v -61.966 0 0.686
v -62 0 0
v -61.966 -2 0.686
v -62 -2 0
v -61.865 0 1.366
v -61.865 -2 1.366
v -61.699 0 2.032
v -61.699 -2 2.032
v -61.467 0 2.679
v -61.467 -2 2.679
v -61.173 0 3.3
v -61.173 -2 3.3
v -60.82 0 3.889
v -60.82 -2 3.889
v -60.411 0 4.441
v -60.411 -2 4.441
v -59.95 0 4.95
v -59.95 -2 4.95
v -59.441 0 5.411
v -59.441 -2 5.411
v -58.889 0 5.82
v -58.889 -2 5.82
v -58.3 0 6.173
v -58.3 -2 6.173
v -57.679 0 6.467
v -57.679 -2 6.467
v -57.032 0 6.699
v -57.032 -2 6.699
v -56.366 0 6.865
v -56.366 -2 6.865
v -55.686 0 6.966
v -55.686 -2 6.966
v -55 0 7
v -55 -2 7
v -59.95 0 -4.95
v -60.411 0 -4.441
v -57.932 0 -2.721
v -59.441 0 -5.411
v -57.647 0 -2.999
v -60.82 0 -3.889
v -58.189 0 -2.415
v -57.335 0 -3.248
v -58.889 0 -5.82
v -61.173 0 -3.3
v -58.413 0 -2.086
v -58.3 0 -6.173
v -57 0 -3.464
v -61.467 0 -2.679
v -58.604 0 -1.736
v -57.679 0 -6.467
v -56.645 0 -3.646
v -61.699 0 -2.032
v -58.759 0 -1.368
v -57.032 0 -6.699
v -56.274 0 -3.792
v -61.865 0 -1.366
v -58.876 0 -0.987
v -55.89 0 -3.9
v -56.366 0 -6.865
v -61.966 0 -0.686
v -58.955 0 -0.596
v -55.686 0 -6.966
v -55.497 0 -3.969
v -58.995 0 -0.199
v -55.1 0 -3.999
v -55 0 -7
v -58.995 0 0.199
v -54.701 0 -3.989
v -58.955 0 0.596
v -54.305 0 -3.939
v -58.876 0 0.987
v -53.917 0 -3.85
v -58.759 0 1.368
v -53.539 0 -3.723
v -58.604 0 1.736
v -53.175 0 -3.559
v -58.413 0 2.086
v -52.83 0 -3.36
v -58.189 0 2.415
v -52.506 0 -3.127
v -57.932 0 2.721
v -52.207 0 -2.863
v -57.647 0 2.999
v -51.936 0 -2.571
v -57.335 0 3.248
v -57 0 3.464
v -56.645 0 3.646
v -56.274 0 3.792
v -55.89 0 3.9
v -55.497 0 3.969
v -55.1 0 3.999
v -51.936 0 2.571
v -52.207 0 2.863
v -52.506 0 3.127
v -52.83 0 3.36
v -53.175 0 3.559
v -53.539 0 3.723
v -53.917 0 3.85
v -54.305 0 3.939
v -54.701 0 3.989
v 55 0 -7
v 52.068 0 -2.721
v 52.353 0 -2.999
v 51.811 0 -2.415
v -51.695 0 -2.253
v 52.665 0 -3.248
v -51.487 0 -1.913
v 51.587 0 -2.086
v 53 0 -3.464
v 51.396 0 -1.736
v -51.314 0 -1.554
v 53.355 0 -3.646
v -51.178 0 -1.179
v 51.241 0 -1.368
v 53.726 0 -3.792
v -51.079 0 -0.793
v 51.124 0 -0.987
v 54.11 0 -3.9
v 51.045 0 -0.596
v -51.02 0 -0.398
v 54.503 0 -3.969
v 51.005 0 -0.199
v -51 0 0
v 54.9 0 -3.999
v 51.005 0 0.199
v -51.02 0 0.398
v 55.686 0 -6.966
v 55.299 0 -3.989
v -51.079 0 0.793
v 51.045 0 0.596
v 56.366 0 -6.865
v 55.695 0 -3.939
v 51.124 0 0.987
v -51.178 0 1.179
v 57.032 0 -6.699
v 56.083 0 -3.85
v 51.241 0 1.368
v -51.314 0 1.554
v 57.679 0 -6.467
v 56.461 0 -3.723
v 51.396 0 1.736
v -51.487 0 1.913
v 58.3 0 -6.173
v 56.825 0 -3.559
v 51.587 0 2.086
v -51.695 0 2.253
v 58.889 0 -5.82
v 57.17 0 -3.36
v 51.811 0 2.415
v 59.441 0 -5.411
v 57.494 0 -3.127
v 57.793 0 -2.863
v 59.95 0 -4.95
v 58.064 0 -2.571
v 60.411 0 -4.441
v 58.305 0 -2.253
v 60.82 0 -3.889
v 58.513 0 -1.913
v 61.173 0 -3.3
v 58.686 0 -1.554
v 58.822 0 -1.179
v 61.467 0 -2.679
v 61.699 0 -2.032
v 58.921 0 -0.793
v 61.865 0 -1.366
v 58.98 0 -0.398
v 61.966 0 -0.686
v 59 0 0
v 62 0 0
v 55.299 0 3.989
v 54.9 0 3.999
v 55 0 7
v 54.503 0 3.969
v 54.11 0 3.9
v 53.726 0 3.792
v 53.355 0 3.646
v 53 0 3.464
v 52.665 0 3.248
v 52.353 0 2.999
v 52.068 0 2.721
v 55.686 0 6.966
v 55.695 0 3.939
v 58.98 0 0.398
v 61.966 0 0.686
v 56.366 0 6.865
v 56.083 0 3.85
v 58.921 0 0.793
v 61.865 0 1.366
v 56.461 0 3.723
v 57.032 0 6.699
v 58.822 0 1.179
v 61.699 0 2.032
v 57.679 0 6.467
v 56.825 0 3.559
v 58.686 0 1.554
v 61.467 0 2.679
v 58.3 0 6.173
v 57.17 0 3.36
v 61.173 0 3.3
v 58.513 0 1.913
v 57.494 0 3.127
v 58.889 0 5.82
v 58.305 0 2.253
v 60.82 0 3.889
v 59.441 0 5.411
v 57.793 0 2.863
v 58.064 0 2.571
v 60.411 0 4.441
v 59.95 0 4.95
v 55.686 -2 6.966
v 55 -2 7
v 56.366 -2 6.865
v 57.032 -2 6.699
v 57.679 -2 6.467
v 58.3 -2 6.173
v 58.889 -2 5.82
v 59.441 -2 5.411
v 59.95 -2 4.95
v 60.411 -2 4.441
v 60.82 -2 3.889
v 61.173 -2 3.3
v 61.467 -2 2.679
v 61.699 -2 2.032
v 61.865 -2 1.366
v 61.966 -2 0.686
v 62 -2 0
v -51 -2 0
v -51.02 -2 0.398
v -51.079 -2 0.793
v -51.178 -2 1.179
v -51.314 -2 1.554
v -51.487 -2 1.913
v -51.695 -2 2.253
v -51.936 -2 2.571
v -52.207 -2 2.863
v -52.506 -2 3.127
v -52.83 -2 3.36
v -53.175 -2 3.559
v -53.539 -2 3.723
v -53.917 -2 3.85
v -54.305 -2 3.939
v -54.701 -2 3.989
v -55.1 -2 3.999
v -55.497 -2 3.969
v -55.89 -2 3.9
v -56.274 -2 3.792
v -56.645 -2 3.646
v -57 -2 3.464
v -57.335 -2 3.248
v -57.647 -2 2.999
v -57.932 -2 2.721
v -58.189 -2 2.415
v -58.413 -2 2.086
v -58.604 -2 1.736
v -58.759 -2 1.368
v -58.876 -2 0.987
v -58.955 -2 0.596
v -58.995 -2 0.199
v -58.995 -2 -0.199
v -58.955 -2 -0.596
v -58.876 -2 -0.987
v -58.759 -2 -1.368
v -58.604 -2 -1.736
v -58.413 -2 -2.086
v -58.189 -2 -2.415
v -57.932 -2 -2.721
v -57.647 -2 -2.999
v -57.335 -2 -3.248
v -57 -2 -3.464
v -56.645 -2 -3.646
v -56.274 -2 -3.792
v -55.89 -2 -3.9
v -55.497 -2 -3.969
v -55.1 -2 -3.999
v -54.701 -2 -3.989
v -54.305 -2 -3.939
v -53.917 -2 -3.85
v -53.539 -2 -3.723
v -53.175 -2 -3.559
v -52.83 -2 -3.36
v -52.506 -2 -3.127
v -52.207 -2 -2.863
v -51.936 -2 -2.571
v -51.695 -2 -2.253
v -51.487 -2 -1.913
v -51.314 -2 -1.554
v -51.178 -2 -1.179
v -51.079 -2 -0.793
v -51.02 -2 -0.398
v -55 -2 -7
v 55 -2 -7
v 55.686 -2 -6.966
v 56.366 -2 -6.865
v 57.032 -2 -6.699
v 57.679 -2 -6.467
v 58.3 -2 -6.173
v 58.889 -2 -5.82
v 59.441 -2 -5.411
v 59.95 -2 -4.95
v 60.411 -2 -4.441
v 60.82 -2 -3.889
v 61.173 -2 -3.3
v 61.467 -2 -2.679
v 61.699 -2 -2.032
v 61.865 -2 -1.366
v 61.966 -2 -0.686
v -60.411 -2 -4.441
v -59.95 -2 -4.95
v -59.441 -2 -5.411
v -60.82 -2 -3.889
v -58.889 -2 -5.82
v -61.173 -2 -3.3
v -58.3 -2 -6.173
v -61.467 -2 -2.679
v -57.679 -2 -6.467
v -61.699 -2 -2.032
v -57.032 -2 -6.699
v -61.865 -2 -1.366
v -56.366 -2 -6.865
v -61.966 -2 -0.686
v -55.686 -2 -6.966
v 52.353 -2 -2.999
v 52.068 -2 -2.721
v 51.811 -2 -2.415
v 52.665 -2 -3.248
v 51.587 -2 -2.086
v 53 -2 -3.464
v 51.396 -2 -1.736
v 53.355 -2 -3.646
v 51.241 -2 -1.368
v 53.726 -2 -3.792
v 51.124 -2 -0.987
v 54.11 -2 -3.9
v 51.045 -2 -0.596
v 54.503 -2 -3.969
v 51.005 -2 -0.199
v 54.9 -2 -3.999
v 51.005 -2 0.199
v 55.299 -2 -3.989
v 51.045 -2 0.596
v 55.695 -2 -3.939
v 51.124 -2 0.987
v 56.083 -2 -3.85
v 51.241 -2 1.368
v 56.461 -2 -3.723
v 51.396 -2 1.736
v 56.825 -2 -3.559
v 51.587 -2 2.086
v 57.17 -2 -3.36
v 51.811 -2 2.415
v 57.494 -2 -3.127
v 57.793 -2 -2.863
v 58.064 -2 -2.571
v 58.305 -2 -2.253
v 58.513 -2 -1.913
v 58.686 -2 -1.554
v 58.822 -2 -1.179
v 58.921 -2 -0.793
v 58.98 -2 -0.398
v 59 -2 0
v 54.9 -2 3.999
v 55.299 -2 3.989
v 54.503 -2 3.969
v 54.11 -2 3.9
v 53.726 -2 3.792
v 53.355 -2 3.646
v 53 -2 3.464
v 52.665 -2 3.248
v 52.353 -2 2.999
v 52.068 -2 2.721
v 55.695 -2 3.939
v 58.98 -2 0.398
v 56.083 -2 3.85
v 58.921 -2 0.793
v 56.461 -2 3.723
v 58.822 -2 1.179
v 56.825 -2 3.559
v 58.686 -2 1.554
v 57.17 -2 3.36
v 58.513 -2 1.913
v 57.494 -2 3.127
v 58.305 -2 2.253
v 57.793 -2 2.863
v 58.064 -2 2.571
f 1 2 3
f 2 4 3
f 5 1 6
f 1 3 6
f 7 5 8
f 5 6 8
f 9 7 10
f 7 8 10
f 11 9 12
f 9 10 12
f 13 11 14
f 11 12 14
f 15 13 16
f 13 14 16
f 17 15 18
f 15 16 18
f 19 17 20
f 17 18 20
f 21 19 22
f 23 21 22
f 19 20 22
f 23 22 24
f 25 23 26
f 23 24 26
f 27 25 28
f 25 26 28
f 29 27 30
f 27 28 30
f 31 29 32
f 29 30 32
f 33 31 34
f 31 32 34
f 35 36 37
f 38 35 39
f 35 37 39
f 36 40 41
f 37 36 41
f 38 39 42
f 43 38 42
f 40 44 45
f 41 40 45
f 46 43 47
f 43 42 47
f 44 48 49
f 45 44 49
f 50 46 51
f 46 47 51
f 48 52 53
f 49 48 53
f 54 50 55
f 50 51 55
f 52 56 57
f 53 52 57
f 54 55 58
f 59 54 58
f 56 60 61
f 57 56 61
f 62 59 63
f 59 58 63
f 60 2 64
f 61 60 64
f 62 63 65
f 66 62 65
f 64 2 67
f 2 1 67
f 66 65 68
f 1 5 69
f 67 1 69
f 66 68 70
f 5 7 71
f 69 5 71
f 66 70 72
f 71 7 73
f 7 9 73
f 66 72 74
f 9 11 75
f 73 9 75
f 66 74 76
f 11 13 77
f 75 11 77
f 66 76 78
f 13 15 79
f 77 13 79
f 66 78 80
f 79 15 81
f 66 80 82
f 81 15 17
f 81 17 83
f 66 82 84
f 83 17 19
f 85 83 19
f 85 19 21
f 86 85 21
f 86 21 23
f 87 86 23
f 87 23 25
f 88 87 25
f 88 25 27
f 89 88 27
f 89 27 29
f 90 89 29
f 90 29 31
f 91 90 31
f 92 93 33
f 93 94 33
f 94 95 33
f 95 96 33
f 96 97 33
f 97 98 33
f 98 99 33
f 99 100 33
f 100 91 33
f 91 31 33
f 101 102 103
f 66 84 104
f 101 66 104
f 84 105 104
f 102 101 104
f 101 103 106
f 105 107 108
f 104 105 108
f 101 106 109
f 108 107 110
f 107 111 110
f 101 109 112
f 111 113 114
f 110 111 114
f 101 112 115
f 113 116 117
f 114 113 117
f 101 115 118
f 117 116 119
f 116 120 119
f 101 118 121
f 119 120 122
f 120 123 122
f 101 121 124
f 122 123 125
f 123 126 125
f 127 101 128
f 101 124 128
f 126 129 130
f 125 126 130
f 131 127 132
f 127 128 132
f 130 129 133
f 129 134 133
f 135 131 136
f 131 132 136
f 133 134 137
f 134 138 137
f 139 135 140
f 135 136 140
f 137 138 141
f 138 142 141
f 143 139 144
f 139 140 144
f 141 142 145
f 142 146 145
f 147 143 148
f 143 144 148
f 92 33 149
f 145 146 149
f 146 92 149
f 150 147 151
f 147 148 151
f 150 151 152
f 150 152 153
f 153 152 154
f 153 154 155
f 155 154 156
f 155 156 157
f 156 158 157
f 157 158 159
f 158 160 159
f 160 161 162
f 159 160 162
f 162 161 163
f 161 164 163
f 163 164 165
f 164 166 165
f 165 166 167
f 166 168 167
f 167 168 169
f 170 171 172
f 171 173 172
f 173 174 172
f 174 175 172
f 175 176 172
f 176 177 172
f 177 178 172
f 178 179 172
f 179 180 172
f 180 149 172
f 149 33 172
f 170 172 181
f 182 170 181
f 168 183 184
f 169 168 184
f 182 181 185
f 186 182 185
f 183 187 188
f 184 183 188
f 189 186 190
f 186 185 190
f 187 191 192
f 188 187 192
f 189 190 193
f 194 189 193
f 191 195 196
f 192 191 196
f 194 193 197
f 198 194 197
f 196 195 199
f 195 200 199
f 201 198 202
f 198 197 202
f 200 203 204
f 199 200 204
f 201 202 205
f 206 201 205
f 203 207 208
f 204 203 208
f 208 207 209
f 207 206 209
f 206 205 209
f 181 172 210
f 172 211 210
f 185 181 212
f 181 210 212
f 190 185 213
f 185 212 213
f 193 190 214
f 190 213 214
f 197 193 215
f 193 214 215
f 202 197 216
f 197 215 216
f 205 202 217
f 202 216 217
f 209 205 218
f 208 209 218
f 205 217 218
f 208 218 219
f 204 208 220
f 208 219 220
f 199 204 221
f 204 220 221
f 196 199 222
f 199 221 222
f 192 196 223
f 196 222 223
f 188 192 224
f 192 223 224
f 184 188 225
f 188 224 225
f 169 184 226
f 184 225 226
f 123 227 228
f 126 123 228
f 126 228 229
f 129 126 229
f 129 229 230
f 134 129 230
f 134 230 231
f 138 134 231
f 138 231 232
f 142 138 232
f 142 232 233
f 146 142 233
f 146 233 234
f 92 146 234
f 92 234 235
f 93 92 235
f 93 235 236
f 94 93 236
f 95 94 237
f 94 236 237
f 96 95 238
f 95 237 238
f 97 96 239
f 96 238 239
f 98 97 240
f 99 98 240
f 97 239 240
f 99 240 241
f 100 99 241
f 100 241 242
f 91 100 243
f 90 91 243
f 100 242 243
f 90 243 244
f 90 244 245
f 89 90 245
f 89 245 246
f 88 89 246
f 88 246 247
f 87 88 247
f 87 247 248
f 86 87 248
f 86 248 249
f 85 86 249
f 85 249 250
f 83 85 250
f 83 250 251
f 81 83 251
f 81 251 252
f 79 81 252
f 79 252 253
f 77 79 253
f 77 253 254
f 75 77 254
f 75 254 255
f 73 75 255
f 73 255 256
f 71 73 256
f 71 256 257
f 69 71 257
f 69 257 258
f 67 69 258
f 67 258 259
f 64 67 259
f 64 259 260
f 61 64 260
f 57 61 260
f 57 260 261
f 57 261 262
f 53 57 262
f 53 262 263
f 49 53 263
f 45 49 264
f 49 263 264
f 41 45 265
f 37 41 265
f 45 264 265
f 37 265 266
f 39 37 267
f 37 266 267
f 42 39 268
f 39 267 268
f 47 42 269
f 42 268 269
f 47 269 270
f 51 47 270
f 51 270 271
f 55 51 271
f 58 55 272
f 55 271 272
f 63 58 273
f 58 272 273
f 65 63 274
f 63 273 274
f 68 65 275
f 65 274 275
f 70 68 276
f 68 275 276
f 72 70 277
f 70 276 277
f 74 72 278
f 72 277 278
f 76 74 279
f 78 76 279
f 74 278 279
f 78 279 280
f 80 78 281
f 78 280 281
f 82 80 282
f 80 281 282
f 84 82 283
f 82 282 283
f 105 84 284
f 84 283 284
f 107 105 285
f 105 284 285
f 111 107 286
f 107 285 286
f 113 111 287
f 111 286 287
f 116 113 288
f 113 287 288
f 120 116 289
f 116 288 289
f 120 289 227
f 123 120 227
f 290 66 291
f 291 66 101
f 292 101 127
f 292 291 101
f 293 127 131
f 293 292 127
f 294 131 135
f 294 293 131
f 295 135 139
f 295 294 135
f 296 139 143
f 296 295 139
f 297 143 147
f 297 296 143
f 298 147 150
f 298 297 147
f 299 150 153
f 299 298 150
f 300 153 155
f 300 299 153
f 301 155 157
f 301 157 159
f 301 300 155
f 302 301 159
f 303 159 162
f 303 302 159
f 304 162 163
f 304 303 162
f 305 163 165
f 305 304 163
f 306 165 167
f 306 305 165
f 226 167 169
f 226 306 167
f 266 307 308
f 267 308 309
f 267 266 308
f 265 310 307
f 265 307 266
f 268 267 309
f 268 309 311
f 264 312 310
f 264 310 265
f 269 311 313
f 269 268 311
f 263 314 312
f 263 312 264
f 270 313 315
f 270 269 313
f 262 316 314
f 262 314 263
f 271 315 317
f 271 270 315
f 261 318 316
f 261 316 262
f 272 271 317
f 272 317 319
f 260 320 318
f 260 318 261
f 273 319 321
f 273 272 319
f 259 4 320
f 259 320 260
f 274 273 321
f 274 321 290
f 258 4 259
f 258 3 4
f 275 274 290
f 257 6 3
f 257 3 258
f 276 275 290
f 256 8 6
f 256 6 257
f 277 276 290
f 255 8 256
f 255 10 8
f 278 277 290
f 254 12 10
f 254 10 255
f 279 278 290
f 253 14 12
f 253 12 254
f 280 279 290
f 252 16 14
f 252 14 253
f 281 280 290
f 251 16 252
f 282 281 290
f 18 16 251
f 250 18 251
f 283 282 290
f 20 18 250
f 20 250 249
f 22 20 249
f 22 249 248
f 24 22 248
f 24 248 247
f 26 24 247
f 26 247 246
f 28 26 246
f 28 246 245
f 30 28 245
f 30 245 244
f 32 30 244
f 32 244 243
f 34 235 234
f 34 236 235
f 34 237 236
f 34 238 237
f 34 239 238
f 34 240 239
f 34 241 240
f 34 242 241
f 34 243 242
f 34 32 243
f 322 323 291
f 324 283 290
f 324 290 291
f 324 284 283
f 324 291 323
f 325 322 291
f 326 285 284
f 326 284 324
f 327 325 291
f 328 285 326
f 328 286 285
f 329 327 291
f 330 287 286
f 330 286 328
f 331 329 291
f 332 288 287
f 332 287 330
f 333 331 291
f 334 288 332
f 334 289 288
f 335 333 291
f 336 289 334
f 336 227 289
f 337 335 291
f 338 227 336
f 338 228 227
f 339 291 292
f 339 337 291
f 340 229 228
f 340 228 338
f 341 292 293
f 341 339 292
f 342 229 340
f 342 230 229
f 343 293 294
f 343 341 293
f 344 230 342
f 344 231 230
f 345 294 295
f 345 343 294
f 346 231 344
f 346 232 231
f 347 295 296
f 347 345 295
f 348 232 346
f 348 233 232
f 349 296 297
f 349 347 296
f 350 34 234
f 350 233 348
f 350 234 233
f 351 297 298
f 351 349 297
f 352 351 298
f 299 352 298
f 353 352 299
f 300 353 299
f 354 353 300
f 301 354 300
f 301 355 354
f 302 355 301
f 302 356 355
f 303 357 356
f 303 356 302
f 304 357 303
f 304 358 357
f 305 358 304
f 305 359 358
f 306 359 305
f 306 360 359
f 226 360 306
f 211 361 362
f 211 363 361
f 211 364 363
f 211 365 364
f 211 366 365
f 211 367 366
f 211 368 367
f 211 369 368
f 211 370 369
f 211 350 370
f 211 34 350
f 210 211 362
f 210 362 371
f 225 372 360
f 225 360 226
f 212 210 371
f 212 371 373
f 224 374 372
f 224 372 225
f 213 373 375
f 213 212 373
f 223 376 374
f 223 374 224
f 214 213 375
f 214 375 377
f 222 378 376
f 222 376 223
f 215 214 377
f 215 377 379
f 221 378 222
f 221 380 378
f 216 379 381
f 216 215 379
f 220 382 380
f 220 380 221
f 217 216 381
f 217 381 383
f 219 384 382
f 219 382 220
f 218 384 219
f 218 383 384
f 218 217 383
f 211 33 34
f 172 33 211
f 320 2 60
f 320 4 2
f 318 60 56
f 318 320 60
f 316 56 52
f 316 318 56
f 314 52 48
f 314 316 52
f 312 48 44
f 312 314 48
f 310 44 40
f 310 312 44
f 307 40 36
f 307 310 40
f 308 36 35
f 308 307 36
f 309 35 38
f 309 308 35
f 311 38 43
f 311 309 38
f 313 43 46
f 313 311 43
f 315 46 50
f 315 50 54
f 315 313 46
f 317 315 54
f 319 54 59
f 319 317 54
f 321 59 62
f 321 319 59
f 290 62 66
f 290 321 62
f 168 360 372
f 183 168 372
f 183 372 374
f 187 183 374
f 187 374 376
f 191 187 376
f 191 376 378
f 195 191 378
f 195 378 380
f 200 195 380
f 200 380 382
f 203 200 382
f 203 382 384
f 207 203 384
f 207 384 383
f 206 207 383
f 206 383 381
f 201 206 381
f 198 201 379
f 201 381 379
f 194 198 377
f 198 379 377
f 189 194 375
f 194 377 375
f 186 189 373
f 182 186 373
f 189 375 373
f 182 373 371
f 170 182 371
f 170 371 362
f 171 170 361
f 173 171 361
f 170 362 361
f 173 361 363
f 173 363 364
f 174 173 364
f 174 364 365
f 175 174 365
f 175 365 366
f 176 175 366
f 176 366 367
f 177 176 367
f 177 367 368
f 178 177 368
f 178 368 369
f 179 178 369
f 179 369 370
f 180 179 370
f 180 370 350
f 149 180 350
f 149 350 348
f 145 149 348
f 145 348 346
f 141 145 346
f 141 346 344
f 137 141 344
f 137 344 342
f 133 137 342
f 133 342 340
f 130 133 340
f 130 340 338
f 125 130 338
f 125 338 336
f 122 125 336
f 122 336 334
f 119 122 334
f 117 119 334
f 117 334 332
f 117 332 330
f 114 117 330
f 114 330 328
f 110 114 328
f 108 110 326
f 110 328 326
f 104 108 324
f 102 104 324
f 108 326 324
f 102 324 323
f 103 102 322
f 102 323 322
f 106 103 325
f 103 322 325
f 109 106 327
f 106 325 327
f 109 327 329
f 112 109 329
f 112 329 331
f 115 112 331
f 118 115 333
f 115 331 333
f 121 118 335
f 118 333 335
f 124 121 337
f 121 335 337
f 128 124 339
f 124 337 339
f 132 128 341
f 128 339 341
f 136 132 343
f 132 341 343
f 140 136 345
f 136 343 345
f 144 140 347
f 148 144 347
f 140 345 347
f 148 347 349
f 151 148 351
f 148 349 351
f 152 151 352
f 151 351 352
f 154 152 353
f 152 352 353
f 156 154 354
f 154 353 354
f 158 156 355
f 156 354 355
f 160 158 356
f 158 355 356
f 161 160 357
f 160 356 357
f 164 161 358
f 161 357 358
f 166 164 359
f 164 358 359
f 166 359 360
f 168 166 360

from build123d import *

# Parameters (mm, degrees)
F0_W     = 124
F0_H     = 14
F1_DEPTH = 2
F2_R     = 4
F3_DEPTH = 25
F4_R     = 4
F5_DEPTH = 25
F6_R     = 6.99999


# Not quite as in the source:
# - a fillet or chamfer is up to 0.001 mm smaller than in the source, because OpenCascade refuses the exact size


with BuildPart() as f1:
    # F0 (on Front) → F1 (new body)
    with BuildSketch(Plane.XZ):
        Rectangle(F0_W, F0_H)
    extrude(amount=F1_DEPTH)

    # F2 (on face) → F3 (cut)
    with BuildSketch(Plane.XZ.offset(2)):
        with Locations((-55, 0)):
            Circle(F2_R)
    extrude(amount=-F3_DEPTH, mode=Mode.SUBTRACT)

    # F4 (on face) → F5 (cut)
    with BuildSketch(Plane.XZ.offset(2)):
        with Locations((55, 0)):
            Circle(F4_R)
    extrude(amount=-F5_DEPTH, mode=Mode.SUBTRACT)

    # F6 (radius 7 in the source; OpenCascade refuses exactly that, so slightly less here)
    f6_edges = [f1.edges().sort_by_distance(p)[0] for p in [
        (-62, -1, 7),
        (-62, -1, -7),
        (62, -1, 7),
        (62, -1, -7),
    ]]
    fillet(f6_edges, radius=F6_R)


solid = f1.part
